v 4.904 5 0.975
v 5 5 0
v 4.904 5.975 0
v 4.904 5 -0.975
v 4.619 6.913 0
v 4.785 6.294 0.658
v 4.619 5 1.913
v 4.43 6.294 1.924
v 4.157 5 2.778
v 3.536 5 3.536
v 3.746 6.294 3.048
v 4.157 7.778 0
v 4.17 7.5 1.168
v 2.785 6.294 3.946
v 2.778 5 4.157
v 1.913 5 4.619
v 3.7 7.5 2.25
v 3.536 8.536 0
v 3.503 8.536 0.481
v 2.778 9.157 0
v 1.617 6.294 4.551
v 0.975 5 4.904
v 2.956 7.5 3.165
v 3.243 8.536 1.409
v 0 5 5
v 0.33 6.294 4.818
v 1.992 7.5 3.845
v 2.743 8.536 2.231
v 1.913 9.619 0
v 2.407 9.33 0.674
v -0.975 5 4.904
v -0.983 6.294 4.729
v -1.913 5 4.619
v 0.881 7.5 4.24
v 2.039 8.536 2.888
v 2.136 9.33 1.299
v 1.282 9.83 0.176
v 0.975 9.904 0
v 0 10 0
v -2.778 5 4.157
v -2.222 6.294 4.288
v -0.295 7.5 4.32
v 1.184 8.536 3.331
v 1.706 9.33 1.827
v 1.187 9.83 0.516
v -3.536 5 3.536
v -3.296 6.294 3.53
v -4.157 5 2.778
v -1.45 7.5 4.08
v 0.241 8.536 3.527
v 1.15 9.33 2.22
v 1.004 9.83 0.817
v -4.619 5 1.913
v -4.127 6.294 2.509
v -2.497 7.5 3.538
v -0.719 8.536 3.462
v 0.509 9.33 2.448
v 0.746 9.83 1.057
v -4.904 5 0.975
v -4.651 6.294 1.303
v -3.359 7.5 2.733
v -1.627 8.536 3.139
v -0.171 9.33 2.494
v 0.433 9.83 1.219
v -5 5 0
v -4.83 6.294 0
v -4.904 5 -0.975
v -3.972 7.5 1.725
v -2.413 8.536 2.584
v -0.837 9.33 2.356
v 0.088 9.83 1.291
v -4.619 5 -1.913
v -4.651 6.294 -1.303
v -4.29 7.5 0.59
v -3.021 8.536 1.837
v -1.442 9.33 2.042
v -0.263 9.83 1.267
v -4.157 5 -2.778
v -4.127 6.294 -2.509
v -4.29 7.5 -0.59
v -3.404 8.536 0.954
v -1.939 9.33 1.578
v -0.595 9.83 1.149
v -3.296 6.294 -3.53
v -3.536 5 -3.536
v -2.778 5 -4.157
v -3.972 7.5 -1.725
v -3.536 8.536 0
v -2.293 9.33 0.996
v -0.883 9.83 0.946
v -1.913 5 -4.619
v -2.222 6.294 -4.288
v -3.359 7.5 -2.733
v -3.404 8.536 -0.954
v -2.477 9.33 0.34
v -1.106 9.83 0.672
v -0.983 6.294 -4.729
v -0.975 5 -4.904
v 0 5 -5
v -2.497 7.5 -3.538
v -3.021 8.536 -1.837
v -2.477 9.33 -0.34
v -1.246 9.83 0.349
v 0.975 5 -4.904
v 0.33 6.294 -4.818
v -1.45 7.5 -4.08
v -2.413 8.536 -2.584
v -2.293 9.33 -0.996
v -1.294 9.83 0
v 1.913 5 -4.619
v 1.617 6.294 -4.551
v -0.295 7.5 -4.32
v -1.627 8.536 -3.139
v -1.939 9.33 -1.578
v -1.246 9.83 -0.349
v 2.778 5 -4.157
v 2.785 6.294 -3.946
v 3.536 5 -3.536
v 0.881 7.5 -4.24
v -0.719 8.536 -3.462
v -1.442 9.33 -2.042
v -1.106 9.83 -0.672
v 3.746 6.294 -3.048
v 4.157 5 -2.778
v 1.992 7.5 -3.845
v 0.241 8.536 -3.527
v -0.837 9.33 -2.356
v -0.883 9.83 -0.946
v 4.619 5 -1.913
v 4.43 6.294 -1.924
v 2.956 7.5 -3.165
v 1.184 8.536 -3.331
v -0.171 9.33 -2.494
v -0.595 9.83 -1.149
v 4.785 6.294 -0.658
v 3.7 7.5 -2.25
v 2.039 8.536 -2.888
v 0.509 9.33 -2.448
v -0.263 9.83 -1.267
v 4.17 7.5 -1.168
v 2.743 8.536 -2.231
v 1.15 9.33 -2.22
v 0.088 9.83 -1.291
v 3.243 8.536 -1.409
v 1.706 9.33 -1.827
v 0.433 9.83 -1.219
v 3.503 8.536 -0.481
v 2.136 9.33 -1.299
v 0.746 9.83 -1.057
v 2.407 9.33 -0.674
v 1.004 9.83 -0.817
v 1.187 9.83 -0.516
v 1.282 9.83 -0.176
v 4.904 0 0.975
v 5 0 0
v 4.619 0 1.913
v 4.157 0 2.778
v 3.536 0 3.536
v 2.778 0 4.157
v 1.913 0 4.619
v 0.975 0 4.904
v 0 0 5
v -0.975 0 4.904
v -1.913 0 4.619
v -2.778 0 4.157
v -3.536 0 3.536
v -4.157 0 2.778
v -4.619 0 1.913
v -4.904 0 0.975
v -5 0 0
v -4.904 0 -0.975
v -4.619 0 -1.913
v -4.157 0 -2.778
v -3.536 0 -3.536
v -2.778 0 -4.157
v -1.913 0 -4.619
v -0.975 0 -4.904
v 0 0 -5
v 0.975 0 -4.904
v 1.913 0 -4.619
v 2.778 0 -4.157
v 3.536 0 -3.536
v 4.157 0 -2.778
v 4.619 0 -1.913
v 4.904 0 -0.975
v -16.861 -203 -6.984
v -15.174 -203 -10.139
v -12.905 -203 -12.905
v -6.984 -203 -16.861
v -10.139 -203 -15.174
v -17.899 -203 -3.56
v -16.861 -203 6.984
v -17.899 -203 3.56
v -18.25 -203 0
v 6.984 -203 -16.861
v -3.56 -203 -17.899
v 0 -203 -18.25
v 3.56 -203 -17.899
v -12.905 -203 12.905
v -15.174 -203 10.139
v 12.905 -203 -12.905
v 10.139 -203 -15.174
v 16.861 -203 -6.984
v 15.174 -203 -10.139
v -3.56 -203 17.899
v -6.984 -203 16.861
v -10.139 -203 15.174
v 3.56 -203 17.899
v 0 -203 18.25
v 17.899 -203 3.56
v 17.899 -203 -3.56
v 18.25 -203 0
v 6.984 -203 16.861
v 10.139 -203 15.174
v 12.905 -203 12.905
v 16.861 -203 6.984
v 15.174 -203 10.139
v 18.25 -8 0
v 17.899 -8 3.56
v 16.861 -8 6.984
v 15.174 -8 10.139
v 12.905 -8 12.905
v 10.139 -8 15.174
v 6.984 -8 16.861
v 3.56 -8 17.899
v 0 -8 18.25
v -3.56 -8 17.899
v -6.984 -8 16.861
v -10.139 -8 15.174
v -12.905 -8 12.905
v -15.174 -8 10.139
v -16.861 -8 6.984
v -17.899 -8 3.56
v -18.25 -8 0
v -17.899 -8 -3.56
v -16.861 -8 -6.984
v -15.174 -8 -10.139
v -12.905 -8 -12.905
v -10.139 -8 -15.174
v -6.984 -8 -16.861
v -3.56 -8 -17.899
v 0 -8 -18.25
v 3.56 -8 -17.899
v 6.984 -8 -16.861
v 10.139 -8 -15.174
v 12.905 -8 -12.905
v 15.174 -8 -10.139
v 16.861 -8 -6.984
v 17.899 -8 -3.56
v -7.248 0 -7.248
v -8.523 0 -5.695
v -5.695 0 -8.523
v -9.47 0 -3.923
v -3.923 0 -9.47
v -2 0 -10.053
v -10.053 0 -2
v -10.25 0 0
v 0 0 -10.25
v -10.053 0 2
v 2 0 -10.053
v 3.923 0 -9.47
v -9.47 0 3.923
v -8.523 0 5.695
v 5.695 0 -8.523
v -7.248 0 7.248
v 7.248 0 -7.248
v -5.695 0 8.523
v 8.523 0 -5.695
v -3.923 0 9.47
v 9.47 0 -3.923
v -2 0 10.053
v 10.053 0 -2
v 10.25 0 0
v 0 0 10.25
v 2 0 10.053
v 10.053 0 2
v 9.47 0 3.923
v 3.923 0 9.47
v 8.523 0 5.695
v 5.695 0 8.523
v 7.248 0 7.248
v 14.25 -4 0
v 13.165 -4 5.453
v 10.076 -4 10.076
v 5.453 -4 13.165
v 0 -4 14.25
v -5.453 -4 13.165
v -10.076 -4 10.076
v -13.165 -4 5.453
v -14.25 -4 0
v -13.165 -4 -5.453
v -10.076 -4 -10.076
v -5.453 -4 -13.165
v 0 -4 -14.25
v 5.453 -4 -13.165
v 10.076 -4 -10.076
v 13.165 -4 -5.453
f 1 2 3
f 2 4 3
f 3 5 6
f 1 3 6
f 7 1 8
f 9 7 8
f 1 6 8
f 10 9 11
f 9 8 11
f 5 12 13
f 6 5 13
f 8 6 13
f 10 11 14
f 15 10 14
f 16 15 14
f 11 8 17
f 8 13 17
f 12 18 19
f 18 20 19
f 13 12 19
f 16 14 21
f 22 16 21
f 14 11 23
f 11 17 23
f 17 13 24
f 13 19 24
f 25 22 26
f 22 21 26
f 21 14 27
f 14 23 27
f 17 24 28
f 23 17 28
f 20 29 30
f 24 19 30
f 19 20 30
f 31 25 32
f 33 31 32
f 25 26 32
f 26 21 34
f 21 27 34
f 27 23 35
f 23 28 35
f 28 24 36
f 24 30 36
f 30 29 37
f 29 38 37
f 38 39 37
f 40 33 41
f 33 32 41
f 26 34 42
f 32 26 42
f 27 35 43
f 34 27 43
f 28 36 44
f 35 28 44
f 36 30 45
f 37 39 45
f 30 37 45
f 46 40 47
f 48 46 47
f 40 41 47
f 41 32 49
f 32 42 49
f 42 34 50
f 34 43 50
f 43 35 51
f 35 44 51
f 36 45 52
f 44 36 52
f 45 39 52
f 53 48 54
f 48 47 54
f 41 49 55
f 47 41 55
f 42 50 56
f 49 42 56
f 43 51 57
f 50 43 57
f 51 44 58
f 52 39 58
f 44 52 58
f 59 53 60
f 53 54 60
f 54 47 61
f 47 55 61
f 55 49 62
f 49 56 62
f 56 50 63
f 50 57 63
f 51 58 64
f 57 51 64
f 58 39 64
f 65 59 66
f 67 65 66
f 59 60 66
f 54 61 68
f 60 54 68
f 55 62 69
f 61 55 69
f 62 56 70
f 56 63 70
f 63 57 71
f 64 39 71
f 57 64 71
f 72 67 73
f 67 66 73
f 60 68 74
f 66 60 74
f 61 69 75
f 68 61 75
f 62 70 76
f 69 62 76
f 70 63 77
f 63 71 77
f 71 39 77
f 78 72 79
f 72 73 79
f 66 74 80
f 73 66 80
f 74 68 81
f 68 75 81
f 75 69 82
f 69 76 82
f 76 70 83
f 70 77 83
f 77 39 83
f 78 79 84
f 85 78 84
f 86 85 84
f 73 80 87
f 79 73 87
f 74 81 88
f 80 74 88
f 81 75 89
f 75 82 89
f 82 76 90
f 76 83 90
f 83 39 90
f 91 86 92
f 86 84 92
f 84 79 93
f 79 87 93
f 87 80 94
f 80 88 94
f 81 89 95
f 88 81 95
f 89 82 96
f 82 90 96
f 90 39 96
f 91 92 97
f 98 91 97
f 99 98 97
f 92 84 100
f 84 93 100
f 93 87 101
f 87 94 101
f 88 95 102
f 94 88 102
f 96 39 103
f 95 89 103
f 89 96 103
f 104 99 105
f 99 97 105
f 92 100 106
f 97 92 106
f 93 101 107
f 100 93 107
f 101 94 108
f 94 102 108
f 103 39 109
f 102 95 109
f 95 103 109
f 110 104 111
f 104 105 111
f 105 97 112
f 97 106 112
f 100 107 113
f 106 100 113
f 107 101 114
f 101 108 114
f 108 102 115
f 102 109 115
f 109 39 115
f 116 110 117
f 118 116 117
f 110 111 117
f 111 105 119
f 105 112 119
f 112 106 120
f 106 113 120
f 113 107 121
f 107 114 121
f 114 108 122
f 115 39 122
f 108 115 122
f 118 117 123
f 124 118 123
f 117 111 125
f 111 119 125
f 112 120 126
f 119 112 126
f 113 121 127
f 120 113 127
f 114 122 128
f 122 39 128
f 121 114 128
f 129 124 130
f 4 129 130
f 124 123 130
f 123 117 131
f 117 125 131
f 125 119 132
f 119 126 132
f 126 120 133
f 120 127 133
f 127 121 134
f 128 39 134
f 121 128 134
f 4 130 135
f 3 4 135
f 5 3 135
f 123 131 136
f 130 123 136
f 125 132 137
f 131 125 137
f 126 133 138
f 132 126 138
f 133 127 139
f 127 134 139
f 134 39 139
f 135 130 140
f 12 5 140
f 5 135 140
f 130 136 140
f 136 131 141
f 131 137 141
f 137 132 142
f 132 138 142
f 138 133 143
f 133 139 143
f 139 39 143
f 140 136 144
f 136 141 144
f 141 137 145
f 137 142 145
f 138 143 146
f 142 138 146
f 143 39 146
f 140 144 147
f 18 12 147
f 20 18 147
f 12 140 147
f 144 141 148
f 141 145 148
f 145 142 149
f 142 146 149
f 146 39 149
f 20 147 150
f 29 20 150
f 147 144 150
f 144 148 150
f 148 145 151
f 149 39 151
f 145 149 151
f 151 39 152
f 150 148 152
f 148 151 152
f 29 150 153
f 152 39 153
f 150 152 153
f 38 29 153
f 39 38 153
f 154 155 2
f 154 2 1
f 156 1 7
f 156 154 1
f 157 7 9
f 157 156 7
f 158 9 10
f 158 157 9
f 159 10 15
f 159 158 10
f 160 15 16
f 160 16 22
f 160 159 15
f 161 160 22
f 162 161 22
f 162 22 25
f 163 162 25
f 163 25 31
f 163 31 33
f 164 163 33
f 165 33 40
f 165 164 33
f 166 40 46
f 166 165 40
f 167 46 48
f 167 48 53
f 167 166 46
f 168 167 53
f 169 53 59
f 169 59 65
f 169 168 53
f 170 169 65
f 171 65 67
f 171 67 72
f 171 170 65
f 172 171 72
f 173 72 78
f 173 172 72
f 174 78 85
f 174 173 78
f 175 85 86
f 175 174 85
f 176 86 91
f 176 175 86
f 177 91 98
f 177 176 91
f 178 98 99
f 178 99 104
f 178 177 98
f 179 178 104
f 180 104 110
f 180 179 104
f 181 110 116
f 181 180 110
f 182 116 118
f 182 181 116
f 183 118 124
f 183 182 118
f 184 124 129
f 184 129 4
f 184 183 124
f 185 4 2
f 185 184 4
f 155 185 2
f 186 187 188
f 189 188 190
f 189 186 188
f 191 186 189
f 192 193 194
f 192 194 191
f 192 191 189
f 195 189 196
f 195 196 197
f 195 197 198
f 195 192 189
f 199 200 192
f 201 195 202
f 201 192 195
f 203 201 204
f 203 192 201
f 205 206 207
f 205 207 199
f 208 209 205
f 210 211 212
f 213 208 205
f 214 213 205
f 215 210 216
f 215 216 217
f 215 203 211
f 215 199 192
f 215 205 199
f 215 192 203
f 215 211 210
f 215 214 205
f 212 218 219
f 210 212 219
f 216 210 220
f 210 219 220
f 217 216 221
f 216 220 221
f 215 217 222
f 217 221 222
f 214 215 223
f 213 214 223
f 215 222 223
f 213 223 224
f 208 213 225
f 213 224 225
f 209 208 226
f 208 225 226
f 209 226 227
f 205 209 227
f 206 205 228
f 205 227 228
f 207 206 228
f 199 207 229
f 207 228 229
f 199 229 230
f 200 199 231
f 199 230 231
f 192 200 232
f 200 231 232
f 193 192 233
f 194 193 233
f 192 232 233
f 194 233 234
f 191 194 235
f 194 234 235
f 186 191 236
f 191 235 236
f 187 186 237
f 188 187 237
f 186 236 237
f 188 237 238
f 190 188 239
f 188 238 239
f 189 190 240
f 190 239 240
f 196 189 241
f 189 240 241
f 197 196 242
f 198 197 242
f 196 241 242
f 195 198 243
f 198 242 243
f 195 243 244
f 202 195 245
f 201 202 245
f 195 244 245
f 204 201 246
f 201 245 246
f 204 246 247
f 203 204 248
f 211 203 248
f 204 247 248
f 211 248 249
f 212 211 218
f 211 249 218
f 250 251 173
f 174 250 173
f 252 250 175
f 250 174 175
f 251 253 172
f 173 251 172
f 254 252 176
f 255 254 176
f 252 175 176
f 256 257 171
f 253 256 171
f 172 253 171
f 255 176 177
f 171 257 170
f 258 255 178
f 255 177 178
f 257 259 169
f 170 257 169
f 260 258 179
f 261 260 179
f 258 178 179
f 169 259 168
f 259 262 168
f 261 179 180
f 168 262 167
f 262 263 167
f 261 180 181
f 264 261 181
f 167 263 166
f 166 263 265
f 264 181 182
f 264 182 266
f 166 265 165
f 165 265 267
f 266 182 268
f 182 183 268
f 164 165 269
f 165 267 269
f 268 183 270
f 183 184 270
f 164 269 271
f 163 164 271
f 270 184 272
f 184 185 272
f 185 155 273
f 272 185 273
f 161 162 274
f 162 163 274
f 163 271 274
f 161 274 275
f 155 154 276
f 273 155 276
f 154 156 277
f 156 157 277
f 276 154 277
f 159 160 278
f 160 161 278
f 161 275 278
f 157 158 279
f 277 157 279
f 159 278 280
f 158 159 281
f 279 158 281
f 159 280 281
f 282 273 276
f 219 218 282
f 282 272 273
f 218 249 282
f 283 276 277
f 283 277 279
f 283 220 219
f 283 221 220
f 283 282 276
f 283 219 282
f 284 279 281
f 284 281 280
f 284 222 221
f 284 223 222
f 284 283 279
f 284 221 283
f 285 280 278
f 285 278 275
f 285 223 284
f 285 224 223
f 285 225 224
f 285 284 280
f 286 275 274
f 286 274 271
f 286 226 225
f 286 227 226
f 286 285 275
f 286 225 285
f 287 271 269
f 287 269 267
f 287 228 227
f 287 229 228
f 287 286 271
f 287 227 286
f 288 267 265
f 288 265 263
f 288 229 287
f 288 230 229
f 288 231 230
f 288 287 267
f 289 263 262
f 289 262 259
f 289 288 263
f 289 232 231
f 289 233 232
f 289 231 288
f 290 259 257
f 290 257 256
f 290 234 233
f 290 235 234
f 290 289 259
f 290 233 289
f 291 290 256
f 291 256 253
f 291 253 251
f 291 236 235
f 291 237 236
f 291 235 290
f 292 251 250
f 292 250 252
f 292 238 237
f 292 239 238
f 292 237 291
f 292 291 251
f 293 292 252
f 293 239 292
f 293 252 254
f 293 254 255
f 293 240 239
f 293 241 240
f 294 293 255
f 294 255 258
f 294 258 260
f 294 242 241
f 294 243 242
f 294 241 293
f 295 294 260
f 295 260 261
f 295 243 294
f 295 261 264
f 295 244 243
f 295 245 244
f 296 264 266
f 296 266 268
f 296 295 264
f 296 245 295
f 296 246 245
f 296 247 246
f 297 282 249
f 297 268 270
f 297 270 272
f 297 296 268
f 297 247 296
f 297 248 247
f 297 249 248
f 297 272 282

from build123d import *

# Parameters (mm, degrees)
F0_R     = 18.25
F1_DEPTH = 203
F2_R     = 5
F3_DEPTH = 10
F4_R     = 5
F5_SIZE  = 8


with BuildPart() as f1:
    # F0 (on Front) → F1 (new body)
    with BuildSketch(Plane.XZ):
        Circle(F0_R)
    extrude(amount=F1_DEPTH)

    # F2 (on Front) → F3 (join)
    with BuildSketch(Plane.XZ):
        Circle(F2_R)
    extrude(amount=-F3_DEPTH)

    # F4
    f4_edges = [f1.edges().sort_by_distance(p)[0] for p in [
        (-5, 10, 0),
    ]]
    fillet(f4_edges, radius=F4_R)

    # F5
    f5_edges = [f1.edges().sort_by_distance(p)[0] for p in [
        (-18.25, 0, 0),
    ]]
    chamfer(f5_edges, length=F5_SIZE)


solid = f1.part
